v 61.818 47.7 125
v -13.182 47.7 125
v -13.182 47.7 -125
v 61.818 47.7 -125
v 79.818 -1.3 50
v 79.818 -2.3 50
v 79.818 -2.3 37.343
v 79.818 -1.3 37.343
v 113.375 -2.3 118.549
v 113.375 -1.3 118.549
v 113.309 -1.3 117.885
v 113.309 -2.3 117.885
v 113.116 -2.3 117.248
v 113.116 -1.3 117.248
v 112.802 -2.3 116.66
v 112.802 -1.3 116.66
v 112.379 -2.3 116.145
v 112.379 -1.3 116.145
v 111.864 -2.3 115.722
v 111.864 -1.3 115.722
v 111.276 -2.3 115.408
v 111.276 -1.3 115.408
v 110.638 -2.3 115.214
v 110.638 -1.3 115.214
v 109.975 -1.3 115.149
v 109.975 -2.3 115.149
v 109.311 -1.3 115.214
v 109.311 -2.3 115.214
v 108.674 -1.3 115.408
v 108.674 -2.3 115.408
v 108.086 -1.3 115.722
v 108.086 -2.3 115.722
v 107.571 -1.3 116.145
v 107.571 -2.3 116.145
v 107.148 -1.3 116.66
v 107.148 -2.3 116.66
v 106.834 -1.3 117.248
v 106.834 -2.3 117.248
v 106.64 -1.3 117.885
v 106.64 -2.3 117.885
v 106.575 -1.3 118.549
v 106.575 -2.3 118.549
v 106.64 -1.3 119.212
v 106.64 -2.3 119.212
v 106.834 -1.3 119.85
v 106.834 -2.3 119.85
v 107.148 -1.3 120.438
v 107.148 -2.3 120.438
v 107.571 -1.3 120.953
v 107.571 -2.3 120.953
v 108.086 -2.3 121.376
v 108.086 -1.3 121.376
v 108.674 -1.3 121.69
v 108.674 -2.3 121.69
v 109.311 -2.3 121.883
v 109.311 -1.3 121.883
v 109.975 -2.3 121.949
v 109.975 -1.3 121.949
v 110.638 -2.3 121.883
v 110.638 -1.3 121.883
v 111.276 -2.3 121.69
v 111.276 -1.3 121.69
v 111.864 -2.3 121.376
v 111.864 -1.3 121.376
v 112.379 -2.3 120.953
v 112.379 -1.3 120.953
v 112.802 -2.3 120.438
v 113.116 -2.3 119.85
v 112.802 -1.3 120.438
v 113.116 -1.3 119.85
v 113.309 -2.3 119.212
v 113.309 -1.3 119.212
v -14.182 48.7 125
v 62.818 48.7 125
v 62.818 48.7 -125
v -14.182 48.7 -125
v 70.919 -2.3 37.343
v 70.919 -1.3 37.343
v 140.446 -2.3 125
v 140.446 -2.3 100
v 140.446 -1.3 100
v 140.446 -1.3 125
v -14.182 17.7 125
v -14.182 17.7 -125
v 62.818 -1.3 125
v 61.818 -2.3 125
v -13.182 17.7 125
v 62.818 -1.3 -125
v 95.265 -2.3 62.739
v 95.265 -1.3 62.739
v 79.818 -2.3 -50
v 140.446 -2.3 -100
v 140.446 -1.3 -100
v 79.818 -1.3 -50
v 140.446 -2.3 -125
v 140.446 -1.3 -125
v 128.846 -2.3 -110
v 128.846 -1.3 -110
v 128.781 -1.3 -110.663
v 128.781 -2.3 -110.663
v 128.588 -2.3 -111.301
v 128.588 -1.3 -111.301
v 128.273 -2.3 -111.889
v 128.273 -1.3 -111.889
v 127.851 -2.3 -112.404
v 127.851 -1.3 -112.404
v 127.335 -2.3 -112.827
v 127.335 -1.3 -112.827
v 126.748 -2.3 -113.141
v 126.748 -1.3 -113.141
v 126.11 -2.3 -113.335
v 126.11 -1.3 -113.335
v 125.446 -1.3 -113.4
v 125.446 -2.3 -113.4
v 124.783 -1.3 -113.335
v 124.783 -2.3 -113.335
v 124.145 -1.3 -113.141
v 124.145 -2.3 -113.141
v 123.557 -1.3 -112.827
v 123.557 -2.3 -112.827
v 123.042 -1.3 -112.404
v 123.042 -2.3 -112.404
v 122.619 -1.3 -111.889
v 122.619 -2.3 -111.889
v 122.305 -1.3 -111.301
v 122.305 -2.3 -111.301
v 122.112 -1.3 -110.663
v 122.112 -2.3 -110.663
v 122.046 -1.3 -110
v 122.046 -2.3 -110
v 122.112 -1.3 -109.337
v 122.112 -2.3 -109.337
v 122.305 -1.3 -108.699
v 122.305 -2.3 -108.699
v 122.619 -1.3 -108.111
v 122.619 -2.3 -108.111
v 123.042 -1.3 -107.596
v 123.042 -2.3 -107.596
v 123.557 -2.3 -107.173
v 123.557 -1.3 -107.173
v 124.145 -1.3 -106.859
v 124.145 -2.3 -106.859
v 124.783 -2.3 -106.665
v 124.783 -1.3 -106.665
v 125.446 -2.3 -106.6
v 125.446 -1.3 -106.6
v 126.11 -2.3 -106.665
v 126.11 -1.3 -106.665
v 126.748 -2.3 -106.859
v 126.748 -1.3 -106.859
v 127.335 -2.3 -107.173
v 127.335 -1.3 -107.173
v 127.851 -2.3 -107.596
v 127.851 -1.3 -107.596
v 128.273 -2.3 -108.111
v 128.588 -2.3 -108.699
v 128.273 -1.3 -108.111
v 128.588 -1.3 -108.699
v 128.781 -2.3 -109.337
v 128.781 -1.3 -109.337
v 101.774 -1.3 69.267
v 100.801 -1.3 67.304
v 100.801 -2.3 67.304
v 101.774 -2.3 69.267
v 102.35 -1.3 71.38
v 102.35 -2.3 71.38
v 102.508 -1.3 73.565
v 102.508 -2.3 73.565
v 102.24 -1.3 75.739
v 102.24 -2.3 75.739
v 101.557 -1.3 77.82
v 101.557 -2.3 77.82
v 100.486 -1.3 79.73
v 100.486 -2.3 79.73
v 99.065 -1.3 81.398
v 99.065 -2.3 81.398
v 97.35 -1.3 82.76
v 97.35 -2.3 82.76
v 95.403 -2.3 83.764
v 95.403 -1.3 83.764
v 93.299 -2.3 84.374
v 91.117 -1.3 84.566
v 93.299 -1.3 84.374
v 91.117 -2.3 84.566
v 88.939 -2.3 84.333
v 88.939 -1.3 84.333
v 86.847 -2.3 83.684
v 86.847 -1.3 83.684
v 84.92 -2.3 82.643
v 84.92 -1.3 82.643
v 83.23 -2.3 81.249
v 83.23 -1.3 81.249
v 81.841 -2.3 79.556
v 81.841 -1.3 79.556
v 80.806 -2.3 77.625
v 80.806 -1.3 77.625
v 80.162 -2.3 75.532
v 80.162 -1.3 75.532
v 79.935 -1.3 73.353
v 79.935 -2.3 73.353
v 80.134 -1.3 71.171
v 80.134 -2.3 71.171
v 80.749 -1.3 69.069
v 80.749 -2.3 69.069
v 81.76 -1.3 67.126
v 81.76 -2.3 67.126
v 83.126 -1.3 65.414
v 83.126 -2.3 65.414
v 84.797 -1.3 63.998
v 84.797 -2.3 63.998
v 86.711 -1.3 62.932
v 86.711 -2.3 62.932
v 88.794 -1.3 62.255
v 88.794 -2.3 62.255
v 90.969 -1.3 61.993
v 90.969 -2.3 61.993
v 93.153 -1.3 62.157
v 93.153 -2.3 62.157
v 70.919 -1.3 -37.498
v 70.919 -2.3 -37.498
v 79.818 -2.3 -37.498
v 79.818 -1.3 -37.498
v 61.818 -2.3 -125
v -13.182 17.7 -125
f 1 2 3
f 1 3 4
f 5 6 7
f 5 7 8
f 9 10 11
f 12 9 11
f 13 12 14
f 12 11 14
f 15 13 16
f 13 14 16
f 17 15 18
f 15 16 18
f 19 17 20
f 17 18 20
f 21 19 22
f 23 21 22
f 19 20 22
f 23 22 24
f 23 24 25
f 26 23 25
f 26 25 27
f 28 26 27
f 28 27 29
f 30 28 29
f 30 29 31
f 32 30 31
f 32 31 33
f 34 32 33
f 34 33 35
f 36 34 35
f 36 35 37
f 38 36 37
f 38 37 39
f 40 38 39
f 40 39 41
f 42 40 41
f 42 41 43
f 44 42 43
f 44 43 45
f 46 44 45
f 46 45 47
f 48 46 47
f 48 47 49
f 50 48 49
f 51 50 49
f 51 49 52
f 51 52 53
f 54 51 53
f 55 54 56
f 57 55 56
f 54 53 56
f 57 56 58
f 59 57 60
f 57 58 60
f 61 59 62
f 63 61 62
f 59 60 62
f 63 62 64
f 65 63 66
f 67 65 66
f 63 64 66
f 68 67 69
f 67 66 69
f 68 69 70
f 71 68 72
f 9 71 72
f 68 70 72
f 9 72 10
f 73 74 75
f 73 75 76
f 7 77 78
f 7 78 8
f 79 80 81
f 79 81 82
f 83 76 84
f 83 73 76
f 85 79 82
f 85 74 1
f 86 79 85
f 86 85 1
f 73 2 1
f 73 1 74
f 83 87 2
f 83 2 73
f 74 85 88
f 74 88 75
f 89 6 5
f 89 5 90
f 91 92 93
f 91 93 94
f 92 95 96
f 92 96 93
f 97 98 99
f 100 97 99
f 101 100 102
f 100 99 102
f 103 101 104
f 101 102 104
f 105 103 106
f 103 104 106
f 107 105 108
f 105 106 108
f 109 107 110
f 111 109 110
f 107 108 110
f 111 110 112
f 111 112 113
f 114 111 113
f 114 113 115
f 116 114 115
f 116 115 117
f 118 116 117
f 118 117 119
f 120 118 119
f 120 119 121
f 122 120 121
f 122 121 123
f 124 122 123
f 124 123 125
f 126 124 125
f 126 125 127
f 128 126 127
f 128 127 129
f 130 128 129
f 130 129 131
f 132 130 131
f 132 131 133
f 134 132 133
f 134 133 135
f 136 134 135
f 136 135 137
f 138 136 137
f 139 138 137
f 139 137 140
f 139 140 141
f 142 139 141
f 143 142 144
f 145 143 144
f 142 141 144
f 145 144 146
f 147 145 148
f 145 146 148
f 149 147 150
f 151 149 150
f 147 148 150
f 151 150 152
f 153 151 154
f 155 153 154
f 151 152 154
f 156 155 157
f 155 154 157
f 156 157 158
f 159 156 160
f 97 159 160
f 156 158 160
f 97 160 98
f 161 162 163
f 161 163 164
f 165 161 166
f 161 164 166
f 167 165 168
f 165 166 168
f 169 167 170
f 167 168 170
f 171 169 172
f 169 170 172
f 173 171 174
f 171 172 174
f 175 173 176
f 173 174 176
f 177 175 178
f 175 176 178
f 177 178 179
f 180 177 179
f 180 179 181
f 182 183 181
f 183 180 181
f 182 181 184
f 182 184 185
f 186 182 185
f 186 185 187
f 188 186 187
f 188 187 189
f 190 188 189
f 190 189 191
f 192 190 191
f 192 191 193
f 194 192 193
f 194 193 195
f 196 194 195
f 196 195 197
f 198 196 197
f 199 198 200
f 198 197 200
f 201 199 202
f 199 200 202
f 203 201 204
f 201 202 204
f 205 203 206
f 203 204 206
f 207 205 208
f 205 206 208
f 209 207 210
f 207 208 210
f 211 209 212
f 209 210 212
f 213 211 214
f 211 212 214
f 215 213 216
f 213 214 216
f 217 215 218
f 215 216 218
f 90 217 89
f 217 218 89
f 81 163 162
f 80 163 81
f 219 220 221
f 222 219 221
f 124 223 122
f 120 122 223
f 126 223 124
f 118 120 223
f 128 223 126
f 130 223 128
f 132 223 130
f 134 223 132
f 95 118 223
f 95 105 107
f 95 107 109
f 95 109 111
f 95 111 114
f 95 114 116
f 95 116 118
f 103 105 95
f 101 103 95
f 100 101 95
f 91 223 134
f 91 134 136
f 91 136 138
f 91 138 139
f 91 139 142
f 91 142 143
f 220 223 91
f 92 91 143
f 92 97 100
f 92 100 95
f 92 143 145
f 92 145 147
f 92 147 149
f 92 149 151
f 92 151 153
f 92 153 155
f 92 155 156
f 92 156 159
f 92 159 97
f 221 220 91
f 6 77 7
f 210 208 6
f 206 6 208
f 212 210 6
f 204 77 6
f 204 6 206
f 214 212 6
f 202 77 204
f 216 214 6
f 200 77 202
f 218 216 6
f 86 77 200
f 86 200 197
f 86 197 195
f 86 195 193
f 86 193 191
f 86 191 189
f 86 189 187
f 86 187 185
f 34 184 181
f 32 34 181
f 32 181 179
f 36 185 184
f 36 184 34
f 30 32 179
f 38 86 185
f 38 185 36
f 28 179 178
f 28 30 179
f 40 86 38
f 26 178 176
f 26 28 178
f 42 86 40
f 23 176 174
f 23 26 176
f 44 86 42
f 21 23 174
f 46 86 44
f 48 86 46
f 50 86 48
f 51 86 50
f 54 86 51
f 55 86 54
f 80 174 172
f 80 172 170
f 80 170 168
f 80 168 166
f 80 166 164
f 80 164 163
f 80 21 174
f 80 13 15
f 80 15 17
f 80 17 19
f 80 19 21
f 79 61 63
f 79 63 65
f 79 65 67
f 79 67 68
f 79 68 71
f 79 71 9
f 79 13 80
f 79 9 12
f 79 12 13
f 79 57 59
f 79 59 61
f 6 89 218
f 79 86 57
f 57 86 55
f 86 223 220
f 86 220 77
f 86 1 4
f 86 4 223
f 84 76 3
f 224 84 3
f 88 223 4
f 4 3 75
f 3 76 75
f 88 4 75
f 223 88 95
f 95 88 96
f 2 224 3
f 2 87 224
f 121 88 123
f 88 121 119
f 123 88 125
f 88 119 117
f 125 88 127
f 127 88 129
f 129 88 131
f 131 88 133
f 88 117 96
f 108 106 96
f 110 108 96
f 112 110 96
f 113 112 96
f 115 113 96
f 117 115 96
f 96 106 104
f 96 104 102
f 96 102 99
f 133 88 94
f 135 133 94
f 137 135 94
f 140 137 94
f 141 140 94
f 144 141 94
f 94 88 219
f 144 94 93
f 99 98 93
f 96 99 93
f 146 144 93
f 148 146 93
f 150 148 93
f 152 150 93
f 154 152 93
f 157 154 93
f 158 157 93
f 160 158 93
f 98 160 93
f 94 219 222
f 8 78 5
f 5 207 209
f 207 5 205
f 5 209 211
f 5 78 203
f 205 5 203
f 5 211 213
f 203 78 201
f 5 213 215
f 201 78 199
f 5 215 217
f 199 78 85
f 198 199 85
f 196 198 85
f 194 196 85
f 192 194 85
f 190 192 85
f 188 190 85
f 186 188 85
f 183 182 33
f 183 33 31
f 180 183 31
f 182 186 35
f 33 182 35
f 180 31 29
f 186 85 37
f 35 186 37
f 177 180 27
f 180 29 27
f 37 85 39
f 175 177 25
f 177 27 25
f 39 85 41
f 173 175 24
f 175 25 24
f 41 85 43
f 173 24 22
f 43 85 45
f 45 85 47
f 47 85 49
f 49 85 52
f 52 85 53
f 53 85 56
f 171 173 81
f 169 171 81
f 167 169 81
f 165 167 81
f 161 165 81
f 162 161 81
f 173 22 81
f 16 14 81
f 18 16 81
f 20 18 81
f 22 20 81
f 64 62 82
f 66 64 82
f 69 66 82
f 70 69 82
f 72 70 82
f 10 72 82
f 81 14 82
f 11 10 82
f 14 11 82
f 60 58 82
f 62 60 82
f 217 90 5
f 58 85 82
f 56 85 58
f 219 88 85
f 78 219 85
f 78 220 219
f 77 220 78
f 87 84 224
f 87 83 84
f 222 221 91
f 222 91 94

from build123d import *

# Parameters (mm, degrees)
BOSS_EXTRUDE1_DEPTH     = 125
BOSS_EXTRUDE3_DEPTH     = 1
TAP_DRILL_FOR_M8_TAP1_D = 6.8
SKETCH7_R               = 11.28805381
CUT_EXTRUDE1_DEPTH      = 1
SKETCH8_W               = 17.605373939
SKETCH8_H               = 74.840918302
CUT_EXTRUDE2_DEPTH      = 1


with BuildPart() as part:
    # Sketch1 → Boss-Extrude1 (new body, symmetric)
    with BuildSketch(Plane.XY):
        Polygon((-13.181947142, 17.7), (-13.181947142, 47.7), (61.818052858, 47.7), (61.818052858, -2.3), (79.818052858, -2.3), (79.818052858, -1.3), (62.818052858, -1.3), (62.818052858, 48.7), (-14.181947142, 48.7), (-14.181947142, 17.7), align=None)
    extrude(amount=BOSS_EXTRUDE1_DEPTH, both=True)

    # Sketch2 → Boss-Extrude3 (add)
    with BuildSketch(Plane.XZ.offset(2.3)):
        Polygon((79.818052858, 125), (79.818052858, 50), (140.446405645, 100), (140.446405645, 125), align=None)
        Polygon((79.818052858, -50), (79.818052858, -125), (140.446405645, -125), (140.446405645, -100), align=None)
    extrude(amount=-BOSS_EXTRUDE3_DEPTH)

    # Tap Drill for M8 Tap1 (through all)
    with Locations(Plane(origin=(0, -2.3, 0), x_dir=(-1, 0, 0), z_dir=(0, -1, 0))):
        with Locations((-125.446405645, 110), (-109.974750597, -118.548748507)):
            Hole(TAP_DRILL_FOR_M8_TAP1_D / 2)

    # Sketch7 → Cut-Extrude1 (cut)
    with BuildSketch(Plane.XZ.offset(2.3)):
        with Locations((91.223262411, 73.278651414)):
            Circle(SKETCH7_R)
    extrude(amount=-CUT_EXTRUDE1_DEPTH, mode=Mode.SUBTRACT)

    # Sketch8 → Cut-Extrude2 (cut)
    with BuildSketch(Plane.XZ.offset(2.3)):
        with Locations((79.721629834, -0.077471799)):
            Rectangle(SKETCH8_W, SKETCH8_H)
    extrude(amount=-CUT_EXTRUDE2_DEPTH, mode=Mode.SUBTRACT)


solid = part.part
